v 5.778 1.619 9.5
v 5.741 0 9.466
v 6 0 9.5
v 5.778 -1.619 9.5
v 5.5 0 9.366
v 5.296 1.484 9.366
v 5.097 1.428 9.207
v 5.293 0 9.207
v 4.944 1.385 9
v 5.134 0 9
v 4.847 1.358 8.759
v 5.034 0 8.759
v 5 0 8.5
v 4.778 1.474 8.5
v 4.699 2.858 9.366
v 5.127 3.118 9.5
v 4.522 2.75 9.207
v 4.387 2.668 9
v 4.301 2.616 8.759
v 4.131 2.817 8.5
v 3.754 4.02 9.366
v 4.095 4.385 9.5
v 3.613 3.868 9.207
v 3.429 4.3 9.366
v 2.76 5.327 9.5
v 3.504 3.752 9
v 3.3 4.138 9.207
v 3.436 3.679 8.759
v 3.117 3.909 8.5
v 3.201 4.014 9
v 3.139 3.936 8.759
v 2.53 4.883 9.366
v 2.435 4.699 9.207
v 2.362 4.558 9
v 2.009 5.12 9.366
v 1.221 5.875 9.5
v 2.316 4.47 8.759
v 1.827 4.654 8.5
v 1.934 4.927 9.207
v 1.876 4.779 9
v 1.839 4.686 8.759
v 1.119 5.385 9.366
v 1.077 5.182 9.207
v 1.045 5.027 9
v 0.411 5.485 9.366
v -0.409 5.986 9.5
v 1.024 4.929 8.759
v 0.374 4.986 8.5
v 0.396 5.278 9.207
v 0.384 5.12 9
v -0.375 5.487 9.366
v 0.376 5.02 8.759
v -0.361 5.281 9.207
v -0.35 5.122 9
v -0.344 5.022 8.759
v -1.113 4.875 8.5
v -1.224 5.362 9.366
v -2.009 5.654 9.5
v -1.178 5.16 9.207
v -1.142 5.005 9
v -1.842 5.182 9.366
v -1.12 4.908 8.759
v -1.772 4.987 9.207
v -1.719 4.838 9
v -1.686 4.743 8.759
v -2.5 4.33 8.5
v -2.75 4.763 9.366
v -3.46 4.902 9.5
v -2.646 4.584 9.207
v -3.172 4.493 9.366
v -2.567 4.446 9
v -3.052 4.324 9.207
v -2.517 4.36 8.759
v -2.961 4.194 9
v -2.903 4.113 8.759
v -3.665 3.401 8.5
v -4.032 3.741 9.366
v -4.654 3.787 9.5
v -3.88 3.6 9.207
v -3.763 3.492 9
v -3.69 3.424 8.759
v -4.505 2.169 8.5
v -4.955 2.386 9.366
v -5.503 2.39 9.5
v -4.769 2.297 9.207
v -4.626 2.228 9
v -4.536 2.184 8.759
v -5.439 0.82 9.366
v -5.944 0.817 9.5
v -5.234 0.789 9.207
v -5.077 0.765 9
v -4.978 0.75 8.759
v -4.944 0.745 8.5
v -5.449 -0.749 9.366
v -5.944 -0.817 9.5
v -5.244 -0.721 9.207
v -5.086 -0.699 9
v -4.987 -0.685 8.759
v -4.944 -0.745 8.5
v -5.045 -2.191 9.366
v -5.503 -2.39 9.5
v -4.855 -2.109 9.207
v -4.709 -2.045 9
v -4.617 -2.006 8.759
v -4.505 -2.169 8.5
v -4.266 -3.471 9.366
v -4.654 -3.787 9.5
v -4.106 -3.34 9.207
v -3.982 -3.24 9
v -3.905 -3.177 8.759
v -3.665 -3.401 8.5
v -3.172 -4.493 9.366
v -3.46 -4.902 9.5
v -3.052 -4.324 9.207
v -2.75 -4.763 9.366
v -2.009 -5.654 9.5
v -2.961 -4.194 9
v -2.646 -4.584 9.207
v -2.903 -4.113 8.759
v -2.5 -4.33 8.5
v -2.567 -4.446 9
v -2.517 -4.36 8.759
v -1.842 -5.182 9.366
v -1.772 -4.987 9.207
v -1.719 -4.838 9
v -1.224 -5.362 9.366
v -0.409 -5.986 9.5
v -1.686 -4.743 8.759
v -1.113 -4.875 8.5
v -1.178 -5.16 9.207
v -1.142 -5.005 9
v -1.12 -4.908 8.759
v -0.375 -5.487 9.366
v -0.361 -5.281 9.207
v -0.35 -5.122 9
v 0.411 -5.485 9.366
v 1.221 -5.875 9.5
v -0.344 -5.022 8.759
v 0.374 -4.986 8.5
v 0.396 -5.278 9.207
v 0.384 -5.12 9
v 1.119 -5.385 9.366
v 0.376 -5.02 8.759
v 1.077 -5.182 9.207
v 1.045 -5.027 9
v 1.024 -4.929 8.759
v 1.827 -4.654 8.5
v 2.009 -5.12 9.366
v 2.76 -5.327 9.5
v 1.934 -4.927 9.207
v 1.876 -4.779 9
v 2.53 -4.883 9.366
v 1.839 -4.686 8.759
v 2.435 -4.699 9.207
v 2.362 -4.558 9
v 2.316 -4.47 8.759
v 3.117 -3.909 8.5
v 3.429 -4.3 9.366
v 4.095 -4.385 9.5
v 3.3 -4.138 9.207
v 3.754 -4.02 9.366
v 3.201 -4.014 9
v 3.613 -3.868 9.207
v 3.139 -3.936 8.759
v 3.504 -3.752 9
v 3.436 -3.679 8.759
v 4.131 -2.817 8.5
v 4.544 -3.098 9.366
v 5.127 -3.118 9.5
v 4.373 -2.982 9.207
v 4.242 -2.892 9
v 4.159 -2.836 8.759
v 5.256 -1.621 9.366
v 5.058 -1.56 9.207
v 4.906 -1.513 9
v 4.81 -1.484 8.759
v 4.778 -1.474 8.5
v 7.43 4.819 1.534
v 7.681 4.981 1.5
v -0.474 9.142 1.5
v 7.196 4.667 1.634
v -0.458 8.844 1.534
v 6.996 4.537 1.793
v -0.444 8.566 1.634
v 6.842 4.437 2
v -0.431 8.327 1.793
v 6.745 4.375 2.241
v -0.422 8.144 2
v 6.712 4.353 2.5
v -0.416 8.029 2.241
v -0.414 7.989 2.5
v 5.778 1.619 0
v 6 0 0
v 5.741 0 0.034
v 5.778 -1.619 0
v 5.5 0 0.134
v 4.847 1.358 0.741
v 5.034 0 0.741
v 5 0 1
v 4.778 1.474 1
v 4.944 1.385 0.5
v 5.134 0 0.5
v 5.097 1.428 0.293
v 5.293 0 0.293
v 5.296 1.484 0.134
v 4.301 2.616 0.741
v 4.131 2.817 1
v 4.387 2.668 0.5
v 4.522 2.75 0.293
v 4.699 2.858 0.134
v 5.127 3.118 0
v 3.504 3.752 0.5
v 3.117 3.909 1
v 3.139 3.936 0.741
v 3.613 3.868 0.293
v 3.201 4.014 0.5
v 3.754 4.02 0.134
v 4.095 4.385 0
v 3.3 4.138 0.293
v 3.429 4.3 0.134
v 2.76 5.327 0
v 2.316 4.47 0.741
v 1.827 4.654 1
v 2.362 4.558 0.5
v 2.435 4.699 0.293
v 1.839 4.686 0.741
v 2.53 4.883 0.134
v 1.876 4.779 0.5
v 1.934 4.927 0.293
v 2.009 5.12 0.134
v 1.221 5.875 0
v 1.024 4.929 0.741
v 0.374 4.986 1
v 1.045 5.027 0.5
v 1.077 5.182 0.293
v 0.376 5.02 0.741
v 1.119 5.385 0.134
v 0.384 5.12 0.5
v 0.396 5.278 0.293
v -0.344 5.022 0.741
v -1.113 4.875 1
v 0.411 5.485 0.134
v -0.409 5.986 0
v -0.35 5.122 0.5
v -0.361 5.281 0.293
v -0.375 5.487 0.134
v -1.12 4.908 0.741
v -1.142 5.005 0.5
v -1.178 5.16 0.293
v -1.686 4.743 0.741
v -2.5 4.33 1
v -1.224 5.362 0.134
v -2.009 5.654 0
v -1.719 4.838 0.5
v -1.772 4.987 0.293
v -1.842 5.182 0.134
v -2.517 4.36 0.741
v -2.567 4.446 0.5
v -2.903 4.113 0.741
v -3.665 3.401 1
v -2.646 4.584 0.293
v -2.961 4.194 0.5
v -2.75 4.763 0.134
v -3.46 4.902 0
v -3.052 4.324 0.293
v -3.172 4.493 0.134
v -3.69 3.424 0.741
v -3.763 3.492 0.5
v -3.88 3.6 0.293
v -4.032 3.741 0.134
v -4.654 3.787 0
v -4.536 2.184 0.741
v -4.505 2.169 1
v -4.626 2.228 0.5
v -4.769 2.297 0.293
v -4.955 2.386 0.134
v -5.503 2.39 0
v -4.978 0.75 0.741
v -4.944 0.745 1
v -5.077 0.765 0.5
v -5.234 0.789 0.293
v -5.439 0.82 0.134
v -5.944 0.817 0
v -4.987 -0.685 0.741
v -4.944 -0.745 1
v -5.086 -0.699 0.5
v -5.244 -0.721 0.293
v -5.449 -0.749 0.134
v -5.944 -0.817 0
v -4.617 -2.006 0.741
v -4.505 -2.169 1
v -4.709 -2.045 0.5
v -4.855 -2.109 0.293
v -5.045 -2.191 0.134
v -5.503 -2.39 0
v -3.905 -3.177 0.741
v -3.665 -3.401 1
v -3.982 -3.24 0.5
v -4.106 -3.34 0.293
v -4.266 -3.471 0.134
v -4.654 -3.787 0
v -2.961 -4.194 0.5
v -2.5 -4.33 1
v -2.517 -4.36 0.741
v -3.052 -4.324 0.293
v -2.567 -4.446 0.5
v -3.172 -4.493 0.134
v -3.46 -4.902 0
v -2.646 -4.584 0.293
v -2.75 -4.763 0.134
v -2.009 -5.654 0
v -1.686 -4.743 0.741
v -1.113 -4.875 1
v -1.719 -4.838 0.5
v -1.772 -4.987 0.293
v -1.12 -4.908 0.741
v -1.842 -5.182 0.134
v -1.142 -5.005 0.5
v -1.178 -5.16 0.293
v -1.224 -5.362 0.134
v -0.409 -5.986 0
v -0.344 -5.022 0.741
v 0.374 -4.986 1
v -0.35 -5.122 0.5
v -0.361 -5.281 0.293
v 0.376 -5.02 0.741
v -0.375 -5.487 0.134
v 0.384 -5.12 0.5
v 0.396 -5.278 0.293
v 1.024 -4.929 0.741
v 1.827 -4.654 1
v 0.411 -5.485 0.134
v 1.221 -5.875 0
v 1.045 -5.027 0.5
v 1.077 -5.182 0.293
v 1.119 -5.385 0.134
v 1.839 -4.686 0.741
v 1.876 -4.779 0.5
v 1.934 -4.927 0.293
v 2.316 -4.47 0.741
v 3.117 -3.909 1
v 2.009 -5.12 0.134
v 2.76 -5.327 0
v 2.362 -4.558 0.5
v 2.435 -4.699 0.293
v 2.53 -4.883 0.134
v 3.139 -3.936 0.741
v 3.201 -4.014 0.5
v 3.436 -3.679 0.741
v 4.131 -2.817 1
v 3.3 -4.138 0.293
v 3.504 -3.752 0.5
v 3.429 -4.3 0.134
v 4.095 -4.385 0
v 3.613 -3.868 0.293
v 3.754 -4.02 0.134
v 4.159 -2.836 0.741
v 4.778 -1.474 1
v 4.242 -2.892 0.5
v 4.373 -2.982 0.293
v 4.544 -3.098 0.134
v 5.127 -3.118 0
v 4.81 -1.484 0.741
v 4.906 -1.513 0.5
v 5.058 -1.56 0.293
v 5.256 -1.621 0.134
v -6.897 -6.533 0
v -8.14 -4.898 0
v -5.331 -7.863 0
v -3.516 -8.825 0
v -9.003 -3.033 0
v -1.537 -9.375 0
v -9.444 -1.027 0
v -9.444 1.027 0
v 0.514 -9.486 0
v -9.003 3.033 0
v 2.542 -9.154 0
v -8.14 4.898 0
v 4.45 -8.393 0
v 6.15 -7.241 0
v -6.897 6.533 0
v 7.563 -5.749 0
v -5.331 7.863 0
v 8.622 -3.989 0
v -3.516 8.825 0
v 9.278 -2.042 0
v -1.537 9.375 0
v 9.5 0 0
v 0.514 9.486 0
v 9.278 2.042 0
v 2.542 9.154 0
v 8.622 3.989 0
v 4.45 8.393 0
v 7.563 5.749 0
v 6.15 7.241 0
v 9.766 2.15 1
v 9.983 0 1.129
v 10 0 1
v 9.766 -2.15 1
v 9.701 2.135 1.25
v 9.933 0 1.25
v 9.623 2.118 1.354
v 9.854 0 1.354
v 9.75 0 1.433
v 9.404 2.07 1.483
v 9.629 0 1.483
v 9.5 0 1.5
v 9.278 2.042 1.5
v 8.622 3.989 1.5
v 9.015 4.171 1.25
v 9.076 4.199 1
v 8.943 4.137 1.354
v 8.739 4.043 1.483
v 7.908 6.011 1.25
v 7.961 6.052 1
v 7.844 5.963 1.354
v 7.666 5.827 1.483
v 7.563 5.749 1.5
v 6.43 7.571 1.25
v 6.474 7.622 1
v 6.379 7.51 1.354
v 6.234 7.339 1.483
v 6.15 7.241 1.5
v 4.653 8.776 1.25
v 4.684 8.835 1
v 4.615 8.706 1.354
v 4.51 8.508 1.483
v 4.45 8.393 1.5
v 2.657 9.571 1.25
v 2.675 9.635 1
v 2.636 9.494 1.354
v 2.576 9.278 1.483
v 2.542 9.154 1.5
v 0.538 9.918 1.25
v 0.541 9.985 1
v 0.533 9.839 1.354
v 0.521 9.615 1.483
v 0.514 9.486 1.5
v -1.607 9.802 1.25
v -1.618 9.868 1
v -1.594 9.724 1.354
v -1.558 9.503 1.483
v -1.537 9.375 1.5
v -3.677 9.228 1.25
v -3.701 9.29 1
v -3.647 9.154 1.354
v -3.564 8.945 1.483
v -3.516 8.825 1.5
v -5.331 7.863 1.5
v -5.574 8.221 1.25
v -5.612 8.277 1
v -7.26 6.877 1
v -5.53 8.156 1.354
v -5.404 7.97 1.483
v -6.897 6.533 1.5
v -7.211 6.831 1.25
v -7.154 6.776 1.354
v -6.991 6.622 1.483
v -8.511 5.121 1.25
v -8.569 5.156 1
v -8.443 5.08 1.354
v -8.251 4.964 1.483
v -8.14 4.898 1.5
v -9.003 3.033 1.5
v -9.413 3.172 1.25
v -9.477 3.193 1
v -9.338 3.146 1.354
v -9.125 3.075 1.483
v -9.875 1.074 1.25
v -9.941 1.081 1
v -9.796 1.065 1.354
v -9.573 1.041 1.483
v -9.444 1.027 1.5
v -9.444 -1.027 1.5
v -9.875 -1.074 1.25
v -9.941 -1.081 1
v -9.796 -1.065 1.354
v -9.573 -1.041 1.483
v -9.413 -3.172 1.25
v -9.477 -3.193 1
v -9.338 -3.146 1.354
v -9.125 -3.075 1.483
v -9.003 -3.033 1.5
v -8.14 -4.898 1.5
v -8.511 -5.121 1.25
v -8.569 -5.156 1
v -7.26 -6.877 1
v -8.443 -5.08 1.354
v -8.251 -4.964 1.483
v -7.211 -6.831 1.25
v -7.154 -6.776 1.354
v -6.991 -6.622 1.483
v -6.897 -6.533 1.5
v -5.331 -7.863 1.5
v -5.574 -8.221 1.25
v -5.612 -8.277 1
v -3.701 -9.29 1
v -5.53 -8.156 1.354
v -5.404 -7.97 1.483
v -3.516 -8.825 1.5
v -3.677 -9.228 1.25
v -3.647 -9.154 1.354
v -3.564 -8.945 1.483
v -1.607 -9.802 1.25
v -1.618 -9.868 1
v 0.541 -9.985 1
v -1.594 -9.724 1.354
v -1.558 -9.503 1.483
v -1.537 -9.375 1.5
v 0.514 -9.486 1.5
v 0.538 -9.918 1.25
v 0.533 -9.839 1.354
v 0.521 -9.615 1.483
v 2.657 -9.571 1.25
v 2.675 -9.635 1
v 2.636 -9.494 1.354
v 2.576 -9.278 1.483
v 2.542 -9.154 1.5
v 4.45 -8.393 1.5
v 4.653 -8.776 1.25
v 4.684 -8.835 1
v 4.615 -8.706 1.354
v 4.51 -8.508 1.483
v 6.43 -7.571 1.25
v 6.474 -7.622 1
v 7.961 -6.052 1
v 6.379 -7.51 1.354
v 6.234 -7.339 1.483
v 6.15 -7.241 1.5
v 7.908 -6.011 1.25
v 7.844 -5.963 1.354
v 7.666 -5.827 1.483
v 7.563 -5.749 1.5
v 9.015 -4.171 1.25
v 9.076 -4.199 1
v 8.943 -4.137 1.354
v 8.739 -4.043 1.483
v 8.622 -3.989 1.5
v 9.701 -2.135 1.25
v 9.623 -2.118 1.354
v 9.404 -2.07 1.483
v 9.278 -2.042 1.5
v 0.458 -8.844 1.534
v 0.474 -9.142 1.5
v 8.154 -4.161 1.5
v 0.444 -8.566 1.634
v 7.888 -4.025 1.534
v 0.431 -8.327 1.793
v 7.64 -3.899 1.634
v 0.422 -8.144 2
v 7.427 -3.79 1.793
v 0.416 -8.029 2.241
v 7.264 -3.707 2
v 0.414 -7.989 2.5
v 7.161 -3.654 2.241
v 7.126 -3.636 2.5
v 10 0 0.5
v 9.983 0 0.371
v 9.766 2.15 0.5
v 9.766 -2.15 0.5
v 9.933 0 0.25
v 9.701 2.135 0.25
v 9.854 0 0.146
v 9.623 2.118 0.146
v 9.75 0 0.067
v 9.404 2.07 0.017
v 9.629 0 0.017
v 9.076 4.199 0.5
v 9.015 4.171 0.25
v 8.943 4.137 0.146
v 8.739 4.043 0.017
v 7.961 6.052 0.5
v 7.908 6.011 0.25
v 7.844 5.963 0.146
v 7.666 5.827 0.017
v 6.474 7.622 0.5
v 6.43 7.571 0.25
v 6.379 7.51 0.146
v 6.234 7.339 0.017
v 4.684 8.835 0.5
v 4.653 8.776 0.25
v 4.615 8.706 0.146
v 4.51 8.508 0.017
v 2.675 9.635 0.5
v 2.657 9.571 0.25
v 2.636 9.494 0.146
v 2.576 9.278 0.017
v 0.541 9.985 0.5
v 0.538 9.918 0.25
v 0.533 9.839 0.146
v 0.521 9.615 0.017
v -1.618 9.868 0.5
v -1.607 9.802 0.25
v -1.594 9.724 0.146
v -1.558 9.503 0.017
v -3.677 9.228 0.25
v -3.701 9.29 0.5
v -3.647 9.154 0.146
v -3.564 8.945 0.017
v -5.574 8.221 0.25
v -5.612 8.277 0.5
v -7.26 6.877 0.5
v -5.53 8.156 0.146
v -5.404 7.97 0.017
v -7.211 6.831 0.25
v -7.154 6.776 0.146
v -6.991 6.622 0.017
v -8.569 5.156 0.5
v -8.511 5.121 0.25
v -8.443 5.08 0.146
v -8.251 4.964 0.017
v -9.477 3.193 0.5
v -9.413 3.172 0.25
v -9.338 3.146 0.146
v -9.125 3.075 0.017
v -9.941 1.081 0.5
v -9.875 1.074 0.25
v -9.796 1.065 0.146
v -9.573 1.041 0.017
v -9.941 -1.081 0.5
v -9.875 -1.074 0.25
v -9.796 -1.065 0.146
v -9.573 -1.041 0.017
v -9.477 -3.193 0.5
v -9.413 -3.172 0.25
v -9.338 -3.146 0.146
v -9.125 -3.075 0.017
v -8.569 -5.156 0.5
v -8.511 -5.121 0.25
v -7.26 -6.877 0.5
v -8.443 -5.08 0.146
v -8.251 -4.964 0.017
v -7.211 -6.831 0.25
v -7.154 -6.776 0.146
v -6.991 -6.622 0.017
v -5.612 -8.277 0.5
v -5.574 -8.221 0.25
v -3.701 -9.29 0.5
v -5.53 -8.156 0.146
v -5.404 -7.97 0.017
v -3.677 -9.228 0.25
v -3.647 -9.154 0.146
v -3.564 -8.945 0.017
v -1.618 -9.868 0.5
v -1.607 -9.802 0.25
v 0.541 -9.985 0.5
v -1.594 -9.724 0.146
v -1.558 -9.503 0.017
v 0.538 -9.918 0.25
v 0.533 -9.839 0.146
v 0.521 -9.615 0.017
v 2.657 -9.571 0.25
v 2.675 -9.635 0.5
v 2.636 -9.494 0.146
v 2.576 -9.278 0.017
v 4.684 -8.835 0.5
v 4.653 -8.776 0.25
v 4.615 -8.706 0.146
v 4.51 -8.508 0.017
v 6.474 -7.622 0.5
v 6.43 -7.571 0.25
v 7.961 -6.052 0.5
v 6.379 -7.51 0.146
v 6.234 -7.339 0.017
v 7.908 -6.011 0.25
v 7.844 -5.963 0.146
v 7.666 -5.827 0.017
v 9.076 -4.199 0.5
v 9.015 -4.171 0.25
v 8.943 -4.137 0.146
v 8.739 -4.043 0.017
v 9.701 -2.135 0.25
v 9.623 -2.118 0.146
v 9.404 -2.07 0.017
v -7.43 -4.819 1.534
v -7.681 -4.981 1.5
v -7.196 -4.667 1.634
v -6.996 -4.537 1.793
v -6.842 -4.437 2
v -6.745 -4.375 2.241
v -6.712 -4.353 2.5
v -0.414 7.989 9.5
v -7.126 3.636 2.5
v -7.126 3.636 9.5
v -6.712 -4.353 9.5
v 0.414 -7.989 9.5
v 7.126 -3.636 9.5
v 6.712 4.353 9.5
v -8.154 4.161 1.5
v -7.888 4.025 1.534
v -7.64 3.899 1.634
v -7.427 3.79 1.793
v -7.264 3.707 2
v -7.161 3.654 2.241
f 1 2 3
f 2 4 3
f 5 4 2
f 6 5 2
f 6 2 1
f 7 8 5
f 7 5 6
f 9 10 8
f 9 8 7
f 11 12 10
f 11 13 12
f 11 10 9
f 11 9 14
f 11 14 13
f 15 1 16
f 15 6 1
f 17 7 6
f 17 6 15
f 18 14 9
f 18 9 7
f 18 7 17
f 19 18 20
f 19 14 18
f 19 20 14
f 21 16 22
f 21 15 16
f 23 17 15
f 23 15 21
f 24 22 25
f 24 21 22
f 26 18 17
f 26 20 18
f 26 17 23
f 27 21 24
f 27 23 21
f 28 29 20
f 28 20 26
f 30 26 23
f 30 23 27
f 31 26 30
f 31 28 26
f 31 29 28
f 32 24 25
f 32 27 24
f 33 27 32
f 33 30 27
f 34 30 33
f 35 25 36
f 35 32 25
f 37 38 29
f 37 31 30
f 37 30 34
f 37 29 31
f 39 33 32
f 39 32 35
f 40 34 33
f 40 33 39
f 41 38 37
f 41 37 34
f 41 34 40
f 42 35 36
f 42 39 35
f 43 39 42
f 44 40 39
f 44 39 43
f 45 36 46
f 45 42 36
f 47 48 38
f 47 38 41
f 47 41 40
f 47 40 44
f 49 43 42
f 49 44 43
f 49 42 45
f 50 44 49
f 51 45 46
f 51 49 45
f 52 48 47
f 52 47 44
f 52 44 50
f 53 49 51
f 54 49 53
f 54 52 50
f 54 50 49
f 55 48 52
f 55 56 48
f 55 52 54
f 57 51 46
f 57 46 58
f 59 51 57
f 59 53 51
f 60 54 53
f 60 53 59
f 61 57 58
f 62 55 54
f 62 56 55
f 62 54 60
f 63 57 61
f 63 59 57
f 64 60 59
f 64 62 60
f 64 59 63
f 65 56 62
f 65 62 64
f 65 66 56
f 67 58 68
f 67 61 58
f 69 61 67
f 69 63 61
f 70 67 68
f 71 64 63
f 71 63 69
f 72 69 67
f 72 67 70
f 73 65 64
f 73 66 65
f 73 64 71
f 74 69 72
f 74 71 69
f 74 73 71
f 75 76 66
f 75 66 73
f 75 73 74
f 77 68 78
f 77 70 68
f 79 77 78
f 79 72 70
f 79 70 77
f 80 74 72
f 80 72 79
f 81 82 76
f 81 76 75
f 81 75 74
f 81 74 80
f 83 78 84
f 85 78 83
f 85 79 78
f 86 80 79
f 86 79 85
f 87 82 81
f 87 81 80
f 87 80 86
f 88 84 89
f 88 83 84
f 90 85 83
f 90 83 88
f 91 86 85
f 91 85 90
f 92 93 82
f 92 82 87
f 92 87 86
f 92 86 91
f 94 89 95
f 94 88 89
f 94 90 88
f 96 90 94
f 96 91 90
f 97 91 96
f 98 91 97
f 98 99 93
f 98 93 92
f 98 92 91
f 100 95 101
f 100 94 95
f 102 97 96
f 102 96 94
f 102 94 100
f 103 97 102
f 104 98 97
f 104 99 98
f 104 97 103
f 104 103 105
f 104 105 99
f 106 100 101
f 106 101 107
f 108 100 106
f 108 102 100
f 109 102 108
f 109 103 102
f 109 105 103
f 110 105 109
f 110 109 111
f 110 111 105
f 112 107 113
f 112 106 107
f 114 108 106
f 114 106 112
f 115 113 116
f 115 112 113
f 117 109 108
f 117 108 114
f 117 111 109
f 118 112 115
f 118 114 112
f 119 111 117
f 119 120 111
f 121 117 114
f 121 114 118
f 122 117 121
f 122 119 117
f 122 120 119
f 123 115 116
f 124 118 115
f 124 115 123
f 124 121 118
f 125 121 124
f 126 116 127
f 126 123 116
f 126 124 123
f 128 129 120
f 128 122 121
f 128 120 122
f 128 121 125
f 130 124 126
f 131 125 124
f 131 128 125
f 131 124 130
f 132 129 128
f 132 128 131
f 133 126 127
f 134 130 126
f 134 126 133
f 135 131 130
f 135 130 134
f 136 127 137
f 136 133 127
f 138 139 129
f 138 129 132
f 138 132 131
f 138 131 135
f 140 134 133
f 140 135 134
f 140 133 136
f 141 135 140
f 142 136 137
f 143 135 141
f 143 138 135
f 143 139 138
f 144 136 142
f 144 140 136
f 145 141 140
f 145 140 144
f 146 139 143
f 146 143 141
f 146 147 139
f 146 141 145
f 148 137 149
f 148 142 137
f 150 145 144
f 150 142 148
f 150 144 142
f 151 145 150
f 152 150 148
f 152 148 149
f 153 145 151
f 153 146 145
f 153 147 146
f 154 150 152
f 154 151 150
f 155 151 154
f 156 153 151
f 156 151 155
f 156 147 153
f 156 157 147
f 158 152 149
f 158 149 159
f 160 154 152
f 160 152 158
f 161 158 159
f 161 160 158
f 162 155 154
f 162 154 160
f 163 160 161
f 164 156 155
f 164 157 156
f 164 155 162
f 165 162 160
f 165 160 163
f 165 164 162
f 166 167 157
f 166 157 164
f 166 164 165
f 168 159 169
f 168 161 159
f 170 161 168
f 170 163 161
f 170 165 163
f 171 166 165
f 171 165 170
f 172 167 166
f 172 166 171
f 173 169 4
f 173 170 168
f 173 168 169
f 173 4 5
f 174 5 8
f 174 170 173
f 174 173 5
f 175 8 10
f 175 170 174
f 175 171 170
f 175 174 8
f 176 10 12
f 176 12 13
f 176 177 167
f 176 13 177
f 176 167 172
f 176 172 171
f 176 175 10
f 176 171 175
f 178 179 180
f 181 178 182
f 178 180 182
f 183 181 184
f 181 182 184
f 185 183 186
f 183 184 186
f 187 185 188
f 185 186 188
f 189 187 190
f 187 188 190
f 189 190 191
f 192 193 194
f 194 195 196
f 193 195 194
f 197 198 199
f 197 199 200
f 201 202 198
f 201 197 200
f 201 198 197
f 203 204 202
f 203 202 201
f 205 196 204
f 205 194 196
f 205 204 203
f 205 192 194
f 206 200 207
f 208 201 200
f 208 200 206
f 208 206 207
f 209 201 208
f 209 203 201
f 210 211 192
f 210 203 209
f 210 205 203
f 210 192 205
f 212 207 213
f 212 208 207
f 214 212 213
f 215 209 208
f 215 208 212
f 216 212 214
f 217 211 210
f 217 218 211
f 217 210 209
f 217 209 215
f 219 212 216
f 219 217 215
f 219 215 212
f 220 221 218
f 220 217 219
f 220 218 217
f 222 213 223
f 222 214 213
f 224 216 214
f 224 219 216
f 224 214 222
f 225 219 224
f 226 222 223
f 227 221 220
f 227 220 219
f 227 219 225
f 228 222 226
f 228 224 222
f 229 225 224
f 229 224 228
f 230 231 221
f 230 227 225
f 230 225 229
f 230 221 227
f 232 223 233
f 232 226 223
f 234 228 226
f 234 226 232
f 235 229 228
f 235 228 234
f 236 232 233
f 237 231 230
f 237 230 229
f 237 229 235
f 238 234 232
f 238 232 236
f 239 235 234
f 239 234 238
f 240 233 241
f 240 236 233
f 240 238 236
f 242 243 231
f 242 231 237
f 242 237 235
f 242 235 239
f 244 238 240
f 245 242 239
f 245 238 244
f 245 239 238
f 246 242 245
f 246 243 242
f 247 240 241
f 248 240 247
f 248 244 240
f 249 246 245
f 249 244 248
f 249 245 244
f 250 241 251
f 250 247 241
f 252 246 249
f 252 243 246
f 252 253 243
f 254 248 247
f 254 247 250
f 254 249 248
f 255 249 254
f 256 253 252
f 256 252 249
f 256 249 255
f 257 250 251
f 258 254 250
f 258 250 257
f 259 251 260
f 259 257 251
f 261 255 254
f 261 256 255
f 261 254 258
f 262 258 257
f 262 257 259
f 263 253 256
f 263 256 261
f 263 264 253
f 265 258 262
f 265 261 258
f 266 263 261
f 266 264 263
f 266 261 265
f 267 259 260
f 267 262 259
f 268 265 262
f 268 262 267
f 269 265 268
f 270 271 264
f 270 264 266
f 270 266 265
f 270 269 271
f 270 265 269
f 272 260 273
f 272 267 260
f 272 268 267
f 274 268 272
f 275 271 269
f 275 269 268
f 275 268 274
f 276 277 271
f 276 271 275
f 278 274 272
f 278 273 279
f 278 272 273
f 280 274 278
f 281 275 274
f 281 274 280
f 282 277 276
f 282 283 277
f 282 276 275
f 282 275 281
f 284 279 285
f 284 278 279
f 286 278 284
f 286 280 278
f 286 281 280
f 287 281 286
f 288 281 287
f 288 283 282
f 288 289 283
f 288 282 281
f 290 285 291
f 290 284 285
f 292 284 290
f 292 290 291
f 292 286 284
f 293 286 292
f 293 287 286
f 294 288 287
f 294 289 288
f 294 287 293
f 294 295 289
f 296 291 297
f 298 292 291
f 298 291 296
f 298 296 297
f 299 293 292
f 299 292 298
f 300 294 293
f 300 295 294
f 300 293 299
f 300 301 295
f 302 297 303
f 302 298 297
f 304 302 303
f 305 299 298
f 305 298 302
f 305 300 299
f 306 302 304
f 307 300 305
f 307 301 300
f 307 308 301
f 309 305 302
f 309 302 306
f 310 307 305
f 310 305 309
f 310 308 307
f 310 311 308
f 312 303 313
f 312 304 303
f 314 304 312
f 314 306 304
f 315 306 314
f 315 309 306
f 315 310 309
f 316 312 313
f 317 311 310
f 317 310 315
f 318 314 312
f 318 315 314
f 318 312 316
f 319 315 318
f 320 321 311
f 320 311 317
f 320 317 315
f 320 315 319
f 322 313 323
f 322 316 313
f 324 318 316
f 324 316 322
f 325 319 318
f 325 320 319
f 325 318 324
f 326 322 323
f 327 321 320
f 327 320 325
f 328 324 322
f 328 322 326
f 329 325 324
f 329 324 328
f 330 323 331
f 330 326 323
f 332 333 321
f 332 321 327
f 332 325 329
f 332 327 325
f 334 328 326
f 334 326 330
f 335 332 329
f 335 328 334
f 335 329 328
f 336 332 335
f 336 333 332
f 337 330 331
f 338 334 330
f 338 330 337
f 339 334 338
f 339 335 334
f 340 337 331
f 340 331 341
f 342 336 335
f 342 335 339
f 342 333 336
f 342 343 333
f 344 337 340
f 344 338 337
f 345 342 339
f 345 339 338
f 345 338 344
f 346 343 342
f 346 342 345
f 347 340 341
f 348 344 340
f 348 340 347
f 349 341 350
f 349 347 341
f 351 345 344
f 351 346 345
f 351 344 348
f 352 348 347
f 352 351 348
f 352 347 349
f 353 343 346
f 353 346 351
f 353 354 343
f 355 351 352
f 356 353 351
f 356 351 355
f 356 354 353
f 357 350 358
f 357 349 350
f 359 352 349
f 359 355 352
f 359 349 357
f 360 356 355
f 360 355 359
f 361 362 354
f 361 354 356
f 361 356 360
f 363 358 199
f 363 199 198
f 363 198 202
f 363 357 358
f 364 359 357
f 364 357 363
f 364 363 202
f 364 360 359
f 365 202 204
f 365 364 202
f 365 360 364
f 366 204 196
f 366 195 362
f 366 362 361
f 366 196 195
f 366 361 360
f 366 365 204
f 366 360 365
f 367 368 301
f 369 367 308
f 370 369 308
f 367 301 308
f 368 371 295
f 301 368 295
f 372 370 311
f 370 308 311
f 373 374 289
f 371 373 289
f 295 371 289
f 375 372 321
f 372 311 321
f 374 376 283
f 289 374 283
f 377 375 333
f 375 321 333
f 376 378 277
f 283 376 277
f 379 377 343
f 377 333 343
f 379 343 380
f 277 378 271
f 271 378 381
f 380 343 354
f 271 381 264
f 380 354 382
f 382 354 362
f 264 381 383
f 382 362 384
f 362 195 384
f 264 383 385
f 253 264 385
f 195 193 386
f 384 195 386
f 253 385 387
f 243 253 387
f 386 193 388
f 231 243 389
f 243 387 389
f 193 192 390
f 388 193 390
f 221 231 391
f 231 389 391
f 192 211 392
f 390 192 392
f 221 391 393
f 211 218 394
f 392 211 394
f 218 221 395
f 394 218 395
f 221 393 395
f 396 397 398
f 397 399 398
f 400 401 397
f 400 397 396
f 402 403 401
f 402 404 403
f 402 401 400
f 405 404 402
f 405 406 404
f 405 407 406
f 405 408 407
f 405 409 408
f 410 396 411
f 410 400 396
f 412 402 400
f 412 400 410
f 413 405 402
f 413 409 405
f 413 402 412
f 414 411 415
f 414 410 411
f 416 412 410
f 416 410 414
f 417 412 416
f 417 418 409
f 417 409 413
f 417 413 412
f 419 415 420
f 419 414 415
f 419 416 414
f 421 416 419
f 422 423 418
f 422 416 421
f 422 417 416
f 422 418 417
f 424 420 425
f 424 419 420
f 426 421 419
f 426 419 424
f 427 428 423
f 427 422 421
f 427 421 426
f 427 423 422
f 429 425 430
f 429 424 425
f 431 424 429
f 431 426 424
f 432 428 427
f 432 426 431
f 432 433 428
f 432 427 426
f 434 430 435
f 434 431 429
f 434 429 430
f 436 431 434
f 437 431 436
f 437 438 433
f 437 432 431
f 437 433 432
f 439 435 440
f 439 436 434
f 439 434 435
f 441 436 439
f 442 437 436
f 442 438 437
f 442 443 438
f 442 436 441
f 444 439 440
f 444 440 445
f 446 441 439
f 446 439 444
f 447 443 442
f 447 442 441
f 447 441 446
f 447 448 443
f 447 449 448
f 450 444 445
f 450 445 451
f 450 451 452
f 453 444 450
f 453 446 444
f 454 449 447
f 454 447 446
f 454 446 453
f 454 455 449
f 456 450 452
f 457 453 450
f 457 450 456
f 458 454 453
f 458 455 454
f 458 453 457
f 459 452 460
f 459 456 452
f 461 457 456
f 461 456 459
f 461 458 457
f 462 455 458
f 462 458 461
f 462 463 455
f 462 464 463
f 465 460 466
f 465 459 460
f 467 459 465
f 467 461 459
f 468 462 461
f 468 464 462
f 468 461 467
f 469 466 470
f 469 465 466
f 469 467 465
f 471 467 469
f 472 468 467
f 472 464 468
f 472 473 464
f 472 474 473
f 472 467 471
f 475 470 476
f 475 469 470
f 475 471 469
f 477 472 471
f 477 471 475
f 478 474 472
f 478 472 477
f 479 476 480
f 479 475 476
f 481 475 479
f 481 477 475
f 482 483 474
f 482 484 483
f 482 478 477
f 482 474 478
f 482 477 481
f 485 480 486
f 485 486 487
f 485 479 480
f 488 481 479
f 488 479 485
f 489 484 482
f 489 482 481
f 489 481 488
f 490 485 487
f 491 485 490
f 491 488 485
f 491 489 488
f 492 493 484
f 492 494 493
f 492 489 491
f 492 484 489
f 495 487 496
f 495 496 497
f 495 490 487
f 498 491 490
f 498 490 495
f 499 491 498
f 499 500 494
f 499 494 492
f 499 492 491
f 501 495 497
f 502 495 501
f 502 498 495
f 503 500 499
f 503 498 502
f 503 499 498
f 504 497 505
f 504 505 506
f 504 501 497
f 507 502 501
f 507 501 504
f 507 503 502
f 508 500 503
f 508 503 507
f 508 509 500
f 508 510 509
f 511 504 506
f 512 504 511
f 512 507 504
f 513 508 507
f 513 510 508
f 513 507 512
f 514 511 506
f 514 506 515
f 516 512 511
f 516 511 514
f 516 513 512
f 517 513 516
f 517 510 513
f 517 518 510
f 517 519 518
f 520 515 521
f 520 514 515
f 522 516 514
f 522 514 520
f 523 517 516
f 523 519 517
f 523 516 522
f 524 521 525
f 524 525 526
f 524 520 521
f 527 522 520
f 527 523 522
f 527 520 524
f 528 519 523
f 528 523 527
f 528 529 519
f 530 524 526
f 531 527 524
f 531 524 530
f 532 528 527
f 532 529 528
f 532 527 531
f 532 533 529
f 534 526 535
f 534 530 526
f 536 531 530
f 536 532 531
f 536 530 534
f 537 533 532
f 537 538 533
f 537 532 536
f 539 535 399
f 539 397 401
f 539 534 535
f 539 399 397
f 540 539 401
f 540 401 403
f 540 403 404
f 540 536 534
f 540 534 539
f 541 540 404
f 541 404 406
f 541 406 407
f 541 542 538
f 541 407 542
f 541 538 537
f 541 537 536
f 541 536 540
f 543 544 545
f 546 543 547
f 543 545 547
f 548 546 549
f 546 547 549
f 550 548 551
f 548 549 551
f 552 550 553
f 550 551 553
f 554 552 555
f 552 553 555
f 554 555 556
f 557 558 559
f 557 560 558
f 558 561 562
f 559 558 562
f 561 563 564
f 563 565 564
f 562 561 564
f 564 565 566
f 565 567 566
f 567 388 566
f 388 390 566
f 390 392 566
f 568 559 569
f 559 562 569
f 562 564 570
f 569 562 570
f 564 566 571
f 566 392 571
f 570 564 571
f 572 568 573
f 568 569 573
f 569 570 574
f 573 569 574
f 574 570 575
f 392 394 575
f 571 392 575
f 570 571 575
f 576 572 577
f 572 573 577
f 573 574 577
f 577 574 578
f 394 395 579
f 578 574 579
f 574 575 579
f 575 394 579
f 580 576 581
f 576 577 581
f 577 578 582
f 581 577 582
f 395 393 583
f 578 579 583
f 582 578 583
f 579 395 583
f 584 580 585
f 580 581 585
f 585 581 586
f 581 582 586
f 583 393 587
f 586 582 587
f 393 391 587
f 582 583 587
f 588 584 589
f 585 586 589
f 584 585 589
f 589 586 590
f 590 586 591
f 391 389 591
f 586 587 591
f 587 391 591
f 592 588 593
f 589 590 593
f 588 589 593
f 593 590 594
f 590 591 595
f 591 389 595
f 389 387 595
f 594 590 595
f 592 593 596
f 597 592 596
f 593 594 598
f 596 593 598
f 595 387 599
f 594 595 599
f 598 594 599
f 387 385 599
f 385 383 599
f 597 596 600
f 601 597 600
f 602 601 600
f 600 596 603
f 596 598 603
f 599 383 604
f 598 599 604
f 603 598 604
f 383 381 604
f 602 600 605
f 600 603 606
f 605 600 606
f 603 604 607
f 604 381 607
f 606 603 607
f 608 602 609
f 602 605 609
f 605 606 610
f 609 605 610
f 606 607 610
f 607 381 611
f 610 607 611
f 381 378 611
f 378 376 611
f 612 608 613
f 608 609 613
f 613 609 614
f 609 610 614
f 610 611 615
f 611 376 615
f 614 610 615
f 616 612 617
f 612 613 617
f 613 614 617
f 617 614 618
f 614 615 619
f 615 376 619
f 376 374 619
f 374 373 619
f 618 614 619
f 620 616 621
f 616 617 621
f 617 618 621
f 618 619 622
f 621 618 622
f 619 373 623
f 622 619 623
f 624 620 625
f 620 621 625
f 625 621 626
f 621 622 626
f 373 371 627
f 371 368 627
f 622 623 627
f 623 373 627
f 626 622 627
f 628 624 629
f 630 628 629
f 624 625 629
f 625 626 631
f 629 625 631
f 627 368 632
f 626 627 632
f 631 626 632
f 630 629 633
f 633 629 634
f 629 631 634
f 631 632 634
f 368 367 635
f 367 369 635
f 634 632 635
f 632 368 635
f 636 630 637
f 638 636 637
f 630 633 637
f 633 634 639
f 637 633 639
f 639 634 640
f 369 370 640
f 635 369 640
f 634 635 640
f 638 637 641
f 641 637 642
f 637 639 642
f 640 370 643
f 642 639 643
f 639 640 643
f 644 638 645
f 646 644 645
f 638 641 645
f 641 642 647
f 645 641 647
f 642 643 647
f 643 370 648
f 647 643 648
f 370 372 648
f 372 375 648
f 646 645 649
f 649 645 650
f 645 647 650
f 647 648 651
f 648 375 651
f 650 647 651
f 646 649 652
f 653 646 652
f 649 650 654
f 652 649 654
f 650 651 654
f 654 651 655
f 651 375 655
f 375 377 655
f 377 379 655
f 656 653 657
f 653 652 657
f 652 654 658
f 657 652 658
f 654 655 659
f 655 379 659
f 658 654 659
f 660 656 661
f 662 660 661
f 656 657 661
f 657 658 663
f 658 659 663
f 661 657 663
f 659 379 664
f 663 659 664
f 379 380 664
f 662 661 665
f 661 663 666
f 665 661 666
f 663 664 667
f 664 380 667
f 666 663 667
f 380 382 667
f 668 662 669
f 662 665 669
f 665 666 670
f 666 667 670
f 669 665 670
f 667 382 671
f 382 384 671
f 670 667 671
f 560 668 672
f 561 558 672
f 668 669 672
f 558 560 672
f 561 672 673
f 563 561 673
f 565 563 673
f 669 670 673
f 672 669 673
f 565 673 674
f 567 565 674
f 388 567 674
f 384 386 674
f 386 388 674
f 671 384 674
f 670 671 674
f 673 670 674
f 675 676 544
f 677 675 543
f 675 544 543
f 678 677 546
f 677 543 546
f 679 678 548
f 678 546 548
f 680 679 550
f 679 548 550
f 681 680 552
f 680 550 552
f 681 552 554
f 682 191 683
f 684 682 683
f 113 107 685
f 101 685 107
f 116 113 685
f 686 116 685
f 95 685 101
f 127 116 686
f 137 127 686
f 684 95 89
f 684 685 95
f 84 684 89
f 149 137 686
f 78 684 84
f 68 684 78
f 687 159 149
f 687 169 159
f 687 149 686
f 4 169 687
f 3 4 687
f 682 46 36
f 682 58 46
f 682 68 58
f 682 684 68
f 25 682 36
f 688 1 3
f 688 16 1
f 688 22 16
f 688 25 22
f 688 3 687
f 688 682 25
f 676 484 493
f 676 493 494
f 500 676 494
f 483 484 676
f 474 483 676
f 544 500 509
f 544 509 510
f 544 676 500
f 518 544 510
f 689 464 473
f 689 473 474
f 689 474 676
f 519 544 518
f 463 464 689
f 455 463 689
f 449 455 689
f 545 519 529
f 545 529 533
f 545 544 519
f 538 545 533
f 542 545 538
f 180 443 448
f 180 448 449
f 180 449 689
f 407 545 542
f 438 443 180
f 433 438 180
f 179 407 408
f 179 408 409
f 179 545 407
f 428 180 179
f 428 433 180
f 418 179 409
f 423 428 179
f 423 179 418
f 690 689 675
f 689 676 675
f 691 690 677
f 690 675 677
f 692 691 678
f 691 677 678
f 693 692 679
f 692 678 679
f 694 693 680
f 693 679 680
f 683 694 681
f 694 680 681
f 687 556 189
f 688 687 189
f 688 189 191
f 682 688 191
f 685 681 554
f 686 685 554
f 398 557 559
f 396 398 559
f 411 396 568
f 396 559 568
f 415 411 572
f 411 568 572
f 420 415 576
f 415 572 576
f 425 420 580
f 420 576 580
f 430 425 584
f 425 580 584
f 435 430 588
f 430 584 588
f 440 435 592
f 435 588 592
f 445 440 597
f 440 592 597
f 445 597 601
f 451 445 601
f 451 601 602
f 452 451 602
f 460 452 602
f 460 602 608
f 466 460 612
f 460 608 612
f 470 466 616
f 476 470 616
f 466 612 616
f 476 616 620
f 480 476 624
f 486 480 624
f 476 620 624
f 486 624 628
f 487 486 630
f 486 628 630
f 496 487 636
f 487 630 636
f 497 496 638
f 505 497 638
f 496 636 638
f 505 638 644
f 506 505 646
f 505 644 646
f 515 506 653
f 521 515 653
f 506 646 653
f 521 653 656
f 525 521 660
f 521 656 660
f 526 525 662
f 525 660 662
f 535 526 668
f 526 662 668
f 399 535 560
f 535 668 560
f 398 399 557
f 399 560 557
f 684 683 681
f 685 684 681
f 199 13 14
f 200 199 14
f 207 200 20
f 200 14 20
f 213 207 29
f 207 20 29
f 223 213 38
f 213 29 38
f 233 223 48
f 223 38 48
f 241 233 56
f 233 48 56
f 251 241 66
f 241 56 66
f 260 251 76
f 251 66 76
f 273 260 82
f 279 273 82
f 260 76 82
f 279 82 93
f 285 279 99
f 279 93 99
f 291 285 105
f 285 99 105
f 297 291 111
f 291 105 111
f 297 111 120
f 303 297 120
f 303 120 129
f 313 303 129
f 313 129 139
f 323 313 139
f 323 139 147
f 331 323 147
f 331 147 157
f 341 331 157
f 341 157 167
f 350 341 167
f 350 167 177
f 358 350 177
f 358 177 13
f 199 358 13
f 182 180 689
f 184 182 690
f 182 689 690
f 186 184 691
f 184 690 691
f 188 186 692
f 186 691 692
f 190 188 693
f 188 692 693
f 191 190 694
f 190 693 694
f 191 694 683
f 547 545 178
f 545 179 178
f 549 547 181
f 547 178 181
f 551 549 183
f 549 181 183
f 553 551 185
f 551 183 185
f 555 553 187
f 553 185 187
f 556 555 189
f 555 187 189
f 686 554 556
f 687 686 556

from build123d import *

# Parameters (mm, degrees)
SKETCH1_R           = 10
BOSS_EXTRUDE2_DEPTH = 1.5
FILLET1_R           = 0.5
BOSS_EXTRUDE3_DEPTH = 8
FILLET2_R           = 1
SKETCH5_R           = 5
CUT_EXTRUDE1_DEPTH  = 18.036725155
FILLET3_R           = 1


with BuildPart() as part:
    # Sketch1 → Boss-Extrude2 (new body)
    with BuildSketch(Plane.XY):
        Circle(SKETCH1_R)
    extrude(amount=BOSS_EXTRUDE2_DEPTH)

    # Fillet1
    fillet1_edges = [part.edges().sort_by_distance(p)[0] for p in [
        (-10, 0, 0),
        (-10, 0, 1.5),
    ]]
    fillet(fillet1_edges, radius=FILLET1_R)

    # Sketch3 → Boss-Extrude3 (add)
    with BuildSketch(Plane.XY.offset(1.5)):
        Polygon((-7.125875884, 3.636192085), (-6.711972661, -4.353093498), (0.413903224, -7.989285583), (7.125875884, -3.636192085), (6.711972661, 4.353093498), (-0.413903224, 7.989285583), align=None)
    extrude(amount=BOSS_EXTRUDE3_DEPTH)

    # Fillet2
    fillet2_edges = [part.edges().sort_by_distance(p)[0] for p in [
        (-3.769889554, 5.812738834, 1.5),
        (-6.918924273, -0.358450706, 1.5),
        (-3.149034719, -6.17118954, 1.5),
        (3.769889554, -5.812738834, 1.5),
        (6.918924273, 0.358450706, 1.5),
        (3.149034719, 6.17118954, 1.5),
    ]]
    fillet(fillet2_edges, radius=FILLET2_R)

    # Sketch5 → Cut-Extrude1 (cut, through all)
    with BuildSketch(Plane.XY.offset(9.5)):
        Circle(SKETCH5_R)
    extrude(amount=-CUT_EXTRUDE1_DEPTH, mode=Mode.SUBTRACT)

    # Fillet3
    fillet3_edges = [part.edges().sort_by_distance(p)[0] for p in [
        (-5, 0, 0),
        (-5, 0, 9.5),
    ]]
    fillet(fillet3_edges, radius=FILLET3_R)


solid = part.part
